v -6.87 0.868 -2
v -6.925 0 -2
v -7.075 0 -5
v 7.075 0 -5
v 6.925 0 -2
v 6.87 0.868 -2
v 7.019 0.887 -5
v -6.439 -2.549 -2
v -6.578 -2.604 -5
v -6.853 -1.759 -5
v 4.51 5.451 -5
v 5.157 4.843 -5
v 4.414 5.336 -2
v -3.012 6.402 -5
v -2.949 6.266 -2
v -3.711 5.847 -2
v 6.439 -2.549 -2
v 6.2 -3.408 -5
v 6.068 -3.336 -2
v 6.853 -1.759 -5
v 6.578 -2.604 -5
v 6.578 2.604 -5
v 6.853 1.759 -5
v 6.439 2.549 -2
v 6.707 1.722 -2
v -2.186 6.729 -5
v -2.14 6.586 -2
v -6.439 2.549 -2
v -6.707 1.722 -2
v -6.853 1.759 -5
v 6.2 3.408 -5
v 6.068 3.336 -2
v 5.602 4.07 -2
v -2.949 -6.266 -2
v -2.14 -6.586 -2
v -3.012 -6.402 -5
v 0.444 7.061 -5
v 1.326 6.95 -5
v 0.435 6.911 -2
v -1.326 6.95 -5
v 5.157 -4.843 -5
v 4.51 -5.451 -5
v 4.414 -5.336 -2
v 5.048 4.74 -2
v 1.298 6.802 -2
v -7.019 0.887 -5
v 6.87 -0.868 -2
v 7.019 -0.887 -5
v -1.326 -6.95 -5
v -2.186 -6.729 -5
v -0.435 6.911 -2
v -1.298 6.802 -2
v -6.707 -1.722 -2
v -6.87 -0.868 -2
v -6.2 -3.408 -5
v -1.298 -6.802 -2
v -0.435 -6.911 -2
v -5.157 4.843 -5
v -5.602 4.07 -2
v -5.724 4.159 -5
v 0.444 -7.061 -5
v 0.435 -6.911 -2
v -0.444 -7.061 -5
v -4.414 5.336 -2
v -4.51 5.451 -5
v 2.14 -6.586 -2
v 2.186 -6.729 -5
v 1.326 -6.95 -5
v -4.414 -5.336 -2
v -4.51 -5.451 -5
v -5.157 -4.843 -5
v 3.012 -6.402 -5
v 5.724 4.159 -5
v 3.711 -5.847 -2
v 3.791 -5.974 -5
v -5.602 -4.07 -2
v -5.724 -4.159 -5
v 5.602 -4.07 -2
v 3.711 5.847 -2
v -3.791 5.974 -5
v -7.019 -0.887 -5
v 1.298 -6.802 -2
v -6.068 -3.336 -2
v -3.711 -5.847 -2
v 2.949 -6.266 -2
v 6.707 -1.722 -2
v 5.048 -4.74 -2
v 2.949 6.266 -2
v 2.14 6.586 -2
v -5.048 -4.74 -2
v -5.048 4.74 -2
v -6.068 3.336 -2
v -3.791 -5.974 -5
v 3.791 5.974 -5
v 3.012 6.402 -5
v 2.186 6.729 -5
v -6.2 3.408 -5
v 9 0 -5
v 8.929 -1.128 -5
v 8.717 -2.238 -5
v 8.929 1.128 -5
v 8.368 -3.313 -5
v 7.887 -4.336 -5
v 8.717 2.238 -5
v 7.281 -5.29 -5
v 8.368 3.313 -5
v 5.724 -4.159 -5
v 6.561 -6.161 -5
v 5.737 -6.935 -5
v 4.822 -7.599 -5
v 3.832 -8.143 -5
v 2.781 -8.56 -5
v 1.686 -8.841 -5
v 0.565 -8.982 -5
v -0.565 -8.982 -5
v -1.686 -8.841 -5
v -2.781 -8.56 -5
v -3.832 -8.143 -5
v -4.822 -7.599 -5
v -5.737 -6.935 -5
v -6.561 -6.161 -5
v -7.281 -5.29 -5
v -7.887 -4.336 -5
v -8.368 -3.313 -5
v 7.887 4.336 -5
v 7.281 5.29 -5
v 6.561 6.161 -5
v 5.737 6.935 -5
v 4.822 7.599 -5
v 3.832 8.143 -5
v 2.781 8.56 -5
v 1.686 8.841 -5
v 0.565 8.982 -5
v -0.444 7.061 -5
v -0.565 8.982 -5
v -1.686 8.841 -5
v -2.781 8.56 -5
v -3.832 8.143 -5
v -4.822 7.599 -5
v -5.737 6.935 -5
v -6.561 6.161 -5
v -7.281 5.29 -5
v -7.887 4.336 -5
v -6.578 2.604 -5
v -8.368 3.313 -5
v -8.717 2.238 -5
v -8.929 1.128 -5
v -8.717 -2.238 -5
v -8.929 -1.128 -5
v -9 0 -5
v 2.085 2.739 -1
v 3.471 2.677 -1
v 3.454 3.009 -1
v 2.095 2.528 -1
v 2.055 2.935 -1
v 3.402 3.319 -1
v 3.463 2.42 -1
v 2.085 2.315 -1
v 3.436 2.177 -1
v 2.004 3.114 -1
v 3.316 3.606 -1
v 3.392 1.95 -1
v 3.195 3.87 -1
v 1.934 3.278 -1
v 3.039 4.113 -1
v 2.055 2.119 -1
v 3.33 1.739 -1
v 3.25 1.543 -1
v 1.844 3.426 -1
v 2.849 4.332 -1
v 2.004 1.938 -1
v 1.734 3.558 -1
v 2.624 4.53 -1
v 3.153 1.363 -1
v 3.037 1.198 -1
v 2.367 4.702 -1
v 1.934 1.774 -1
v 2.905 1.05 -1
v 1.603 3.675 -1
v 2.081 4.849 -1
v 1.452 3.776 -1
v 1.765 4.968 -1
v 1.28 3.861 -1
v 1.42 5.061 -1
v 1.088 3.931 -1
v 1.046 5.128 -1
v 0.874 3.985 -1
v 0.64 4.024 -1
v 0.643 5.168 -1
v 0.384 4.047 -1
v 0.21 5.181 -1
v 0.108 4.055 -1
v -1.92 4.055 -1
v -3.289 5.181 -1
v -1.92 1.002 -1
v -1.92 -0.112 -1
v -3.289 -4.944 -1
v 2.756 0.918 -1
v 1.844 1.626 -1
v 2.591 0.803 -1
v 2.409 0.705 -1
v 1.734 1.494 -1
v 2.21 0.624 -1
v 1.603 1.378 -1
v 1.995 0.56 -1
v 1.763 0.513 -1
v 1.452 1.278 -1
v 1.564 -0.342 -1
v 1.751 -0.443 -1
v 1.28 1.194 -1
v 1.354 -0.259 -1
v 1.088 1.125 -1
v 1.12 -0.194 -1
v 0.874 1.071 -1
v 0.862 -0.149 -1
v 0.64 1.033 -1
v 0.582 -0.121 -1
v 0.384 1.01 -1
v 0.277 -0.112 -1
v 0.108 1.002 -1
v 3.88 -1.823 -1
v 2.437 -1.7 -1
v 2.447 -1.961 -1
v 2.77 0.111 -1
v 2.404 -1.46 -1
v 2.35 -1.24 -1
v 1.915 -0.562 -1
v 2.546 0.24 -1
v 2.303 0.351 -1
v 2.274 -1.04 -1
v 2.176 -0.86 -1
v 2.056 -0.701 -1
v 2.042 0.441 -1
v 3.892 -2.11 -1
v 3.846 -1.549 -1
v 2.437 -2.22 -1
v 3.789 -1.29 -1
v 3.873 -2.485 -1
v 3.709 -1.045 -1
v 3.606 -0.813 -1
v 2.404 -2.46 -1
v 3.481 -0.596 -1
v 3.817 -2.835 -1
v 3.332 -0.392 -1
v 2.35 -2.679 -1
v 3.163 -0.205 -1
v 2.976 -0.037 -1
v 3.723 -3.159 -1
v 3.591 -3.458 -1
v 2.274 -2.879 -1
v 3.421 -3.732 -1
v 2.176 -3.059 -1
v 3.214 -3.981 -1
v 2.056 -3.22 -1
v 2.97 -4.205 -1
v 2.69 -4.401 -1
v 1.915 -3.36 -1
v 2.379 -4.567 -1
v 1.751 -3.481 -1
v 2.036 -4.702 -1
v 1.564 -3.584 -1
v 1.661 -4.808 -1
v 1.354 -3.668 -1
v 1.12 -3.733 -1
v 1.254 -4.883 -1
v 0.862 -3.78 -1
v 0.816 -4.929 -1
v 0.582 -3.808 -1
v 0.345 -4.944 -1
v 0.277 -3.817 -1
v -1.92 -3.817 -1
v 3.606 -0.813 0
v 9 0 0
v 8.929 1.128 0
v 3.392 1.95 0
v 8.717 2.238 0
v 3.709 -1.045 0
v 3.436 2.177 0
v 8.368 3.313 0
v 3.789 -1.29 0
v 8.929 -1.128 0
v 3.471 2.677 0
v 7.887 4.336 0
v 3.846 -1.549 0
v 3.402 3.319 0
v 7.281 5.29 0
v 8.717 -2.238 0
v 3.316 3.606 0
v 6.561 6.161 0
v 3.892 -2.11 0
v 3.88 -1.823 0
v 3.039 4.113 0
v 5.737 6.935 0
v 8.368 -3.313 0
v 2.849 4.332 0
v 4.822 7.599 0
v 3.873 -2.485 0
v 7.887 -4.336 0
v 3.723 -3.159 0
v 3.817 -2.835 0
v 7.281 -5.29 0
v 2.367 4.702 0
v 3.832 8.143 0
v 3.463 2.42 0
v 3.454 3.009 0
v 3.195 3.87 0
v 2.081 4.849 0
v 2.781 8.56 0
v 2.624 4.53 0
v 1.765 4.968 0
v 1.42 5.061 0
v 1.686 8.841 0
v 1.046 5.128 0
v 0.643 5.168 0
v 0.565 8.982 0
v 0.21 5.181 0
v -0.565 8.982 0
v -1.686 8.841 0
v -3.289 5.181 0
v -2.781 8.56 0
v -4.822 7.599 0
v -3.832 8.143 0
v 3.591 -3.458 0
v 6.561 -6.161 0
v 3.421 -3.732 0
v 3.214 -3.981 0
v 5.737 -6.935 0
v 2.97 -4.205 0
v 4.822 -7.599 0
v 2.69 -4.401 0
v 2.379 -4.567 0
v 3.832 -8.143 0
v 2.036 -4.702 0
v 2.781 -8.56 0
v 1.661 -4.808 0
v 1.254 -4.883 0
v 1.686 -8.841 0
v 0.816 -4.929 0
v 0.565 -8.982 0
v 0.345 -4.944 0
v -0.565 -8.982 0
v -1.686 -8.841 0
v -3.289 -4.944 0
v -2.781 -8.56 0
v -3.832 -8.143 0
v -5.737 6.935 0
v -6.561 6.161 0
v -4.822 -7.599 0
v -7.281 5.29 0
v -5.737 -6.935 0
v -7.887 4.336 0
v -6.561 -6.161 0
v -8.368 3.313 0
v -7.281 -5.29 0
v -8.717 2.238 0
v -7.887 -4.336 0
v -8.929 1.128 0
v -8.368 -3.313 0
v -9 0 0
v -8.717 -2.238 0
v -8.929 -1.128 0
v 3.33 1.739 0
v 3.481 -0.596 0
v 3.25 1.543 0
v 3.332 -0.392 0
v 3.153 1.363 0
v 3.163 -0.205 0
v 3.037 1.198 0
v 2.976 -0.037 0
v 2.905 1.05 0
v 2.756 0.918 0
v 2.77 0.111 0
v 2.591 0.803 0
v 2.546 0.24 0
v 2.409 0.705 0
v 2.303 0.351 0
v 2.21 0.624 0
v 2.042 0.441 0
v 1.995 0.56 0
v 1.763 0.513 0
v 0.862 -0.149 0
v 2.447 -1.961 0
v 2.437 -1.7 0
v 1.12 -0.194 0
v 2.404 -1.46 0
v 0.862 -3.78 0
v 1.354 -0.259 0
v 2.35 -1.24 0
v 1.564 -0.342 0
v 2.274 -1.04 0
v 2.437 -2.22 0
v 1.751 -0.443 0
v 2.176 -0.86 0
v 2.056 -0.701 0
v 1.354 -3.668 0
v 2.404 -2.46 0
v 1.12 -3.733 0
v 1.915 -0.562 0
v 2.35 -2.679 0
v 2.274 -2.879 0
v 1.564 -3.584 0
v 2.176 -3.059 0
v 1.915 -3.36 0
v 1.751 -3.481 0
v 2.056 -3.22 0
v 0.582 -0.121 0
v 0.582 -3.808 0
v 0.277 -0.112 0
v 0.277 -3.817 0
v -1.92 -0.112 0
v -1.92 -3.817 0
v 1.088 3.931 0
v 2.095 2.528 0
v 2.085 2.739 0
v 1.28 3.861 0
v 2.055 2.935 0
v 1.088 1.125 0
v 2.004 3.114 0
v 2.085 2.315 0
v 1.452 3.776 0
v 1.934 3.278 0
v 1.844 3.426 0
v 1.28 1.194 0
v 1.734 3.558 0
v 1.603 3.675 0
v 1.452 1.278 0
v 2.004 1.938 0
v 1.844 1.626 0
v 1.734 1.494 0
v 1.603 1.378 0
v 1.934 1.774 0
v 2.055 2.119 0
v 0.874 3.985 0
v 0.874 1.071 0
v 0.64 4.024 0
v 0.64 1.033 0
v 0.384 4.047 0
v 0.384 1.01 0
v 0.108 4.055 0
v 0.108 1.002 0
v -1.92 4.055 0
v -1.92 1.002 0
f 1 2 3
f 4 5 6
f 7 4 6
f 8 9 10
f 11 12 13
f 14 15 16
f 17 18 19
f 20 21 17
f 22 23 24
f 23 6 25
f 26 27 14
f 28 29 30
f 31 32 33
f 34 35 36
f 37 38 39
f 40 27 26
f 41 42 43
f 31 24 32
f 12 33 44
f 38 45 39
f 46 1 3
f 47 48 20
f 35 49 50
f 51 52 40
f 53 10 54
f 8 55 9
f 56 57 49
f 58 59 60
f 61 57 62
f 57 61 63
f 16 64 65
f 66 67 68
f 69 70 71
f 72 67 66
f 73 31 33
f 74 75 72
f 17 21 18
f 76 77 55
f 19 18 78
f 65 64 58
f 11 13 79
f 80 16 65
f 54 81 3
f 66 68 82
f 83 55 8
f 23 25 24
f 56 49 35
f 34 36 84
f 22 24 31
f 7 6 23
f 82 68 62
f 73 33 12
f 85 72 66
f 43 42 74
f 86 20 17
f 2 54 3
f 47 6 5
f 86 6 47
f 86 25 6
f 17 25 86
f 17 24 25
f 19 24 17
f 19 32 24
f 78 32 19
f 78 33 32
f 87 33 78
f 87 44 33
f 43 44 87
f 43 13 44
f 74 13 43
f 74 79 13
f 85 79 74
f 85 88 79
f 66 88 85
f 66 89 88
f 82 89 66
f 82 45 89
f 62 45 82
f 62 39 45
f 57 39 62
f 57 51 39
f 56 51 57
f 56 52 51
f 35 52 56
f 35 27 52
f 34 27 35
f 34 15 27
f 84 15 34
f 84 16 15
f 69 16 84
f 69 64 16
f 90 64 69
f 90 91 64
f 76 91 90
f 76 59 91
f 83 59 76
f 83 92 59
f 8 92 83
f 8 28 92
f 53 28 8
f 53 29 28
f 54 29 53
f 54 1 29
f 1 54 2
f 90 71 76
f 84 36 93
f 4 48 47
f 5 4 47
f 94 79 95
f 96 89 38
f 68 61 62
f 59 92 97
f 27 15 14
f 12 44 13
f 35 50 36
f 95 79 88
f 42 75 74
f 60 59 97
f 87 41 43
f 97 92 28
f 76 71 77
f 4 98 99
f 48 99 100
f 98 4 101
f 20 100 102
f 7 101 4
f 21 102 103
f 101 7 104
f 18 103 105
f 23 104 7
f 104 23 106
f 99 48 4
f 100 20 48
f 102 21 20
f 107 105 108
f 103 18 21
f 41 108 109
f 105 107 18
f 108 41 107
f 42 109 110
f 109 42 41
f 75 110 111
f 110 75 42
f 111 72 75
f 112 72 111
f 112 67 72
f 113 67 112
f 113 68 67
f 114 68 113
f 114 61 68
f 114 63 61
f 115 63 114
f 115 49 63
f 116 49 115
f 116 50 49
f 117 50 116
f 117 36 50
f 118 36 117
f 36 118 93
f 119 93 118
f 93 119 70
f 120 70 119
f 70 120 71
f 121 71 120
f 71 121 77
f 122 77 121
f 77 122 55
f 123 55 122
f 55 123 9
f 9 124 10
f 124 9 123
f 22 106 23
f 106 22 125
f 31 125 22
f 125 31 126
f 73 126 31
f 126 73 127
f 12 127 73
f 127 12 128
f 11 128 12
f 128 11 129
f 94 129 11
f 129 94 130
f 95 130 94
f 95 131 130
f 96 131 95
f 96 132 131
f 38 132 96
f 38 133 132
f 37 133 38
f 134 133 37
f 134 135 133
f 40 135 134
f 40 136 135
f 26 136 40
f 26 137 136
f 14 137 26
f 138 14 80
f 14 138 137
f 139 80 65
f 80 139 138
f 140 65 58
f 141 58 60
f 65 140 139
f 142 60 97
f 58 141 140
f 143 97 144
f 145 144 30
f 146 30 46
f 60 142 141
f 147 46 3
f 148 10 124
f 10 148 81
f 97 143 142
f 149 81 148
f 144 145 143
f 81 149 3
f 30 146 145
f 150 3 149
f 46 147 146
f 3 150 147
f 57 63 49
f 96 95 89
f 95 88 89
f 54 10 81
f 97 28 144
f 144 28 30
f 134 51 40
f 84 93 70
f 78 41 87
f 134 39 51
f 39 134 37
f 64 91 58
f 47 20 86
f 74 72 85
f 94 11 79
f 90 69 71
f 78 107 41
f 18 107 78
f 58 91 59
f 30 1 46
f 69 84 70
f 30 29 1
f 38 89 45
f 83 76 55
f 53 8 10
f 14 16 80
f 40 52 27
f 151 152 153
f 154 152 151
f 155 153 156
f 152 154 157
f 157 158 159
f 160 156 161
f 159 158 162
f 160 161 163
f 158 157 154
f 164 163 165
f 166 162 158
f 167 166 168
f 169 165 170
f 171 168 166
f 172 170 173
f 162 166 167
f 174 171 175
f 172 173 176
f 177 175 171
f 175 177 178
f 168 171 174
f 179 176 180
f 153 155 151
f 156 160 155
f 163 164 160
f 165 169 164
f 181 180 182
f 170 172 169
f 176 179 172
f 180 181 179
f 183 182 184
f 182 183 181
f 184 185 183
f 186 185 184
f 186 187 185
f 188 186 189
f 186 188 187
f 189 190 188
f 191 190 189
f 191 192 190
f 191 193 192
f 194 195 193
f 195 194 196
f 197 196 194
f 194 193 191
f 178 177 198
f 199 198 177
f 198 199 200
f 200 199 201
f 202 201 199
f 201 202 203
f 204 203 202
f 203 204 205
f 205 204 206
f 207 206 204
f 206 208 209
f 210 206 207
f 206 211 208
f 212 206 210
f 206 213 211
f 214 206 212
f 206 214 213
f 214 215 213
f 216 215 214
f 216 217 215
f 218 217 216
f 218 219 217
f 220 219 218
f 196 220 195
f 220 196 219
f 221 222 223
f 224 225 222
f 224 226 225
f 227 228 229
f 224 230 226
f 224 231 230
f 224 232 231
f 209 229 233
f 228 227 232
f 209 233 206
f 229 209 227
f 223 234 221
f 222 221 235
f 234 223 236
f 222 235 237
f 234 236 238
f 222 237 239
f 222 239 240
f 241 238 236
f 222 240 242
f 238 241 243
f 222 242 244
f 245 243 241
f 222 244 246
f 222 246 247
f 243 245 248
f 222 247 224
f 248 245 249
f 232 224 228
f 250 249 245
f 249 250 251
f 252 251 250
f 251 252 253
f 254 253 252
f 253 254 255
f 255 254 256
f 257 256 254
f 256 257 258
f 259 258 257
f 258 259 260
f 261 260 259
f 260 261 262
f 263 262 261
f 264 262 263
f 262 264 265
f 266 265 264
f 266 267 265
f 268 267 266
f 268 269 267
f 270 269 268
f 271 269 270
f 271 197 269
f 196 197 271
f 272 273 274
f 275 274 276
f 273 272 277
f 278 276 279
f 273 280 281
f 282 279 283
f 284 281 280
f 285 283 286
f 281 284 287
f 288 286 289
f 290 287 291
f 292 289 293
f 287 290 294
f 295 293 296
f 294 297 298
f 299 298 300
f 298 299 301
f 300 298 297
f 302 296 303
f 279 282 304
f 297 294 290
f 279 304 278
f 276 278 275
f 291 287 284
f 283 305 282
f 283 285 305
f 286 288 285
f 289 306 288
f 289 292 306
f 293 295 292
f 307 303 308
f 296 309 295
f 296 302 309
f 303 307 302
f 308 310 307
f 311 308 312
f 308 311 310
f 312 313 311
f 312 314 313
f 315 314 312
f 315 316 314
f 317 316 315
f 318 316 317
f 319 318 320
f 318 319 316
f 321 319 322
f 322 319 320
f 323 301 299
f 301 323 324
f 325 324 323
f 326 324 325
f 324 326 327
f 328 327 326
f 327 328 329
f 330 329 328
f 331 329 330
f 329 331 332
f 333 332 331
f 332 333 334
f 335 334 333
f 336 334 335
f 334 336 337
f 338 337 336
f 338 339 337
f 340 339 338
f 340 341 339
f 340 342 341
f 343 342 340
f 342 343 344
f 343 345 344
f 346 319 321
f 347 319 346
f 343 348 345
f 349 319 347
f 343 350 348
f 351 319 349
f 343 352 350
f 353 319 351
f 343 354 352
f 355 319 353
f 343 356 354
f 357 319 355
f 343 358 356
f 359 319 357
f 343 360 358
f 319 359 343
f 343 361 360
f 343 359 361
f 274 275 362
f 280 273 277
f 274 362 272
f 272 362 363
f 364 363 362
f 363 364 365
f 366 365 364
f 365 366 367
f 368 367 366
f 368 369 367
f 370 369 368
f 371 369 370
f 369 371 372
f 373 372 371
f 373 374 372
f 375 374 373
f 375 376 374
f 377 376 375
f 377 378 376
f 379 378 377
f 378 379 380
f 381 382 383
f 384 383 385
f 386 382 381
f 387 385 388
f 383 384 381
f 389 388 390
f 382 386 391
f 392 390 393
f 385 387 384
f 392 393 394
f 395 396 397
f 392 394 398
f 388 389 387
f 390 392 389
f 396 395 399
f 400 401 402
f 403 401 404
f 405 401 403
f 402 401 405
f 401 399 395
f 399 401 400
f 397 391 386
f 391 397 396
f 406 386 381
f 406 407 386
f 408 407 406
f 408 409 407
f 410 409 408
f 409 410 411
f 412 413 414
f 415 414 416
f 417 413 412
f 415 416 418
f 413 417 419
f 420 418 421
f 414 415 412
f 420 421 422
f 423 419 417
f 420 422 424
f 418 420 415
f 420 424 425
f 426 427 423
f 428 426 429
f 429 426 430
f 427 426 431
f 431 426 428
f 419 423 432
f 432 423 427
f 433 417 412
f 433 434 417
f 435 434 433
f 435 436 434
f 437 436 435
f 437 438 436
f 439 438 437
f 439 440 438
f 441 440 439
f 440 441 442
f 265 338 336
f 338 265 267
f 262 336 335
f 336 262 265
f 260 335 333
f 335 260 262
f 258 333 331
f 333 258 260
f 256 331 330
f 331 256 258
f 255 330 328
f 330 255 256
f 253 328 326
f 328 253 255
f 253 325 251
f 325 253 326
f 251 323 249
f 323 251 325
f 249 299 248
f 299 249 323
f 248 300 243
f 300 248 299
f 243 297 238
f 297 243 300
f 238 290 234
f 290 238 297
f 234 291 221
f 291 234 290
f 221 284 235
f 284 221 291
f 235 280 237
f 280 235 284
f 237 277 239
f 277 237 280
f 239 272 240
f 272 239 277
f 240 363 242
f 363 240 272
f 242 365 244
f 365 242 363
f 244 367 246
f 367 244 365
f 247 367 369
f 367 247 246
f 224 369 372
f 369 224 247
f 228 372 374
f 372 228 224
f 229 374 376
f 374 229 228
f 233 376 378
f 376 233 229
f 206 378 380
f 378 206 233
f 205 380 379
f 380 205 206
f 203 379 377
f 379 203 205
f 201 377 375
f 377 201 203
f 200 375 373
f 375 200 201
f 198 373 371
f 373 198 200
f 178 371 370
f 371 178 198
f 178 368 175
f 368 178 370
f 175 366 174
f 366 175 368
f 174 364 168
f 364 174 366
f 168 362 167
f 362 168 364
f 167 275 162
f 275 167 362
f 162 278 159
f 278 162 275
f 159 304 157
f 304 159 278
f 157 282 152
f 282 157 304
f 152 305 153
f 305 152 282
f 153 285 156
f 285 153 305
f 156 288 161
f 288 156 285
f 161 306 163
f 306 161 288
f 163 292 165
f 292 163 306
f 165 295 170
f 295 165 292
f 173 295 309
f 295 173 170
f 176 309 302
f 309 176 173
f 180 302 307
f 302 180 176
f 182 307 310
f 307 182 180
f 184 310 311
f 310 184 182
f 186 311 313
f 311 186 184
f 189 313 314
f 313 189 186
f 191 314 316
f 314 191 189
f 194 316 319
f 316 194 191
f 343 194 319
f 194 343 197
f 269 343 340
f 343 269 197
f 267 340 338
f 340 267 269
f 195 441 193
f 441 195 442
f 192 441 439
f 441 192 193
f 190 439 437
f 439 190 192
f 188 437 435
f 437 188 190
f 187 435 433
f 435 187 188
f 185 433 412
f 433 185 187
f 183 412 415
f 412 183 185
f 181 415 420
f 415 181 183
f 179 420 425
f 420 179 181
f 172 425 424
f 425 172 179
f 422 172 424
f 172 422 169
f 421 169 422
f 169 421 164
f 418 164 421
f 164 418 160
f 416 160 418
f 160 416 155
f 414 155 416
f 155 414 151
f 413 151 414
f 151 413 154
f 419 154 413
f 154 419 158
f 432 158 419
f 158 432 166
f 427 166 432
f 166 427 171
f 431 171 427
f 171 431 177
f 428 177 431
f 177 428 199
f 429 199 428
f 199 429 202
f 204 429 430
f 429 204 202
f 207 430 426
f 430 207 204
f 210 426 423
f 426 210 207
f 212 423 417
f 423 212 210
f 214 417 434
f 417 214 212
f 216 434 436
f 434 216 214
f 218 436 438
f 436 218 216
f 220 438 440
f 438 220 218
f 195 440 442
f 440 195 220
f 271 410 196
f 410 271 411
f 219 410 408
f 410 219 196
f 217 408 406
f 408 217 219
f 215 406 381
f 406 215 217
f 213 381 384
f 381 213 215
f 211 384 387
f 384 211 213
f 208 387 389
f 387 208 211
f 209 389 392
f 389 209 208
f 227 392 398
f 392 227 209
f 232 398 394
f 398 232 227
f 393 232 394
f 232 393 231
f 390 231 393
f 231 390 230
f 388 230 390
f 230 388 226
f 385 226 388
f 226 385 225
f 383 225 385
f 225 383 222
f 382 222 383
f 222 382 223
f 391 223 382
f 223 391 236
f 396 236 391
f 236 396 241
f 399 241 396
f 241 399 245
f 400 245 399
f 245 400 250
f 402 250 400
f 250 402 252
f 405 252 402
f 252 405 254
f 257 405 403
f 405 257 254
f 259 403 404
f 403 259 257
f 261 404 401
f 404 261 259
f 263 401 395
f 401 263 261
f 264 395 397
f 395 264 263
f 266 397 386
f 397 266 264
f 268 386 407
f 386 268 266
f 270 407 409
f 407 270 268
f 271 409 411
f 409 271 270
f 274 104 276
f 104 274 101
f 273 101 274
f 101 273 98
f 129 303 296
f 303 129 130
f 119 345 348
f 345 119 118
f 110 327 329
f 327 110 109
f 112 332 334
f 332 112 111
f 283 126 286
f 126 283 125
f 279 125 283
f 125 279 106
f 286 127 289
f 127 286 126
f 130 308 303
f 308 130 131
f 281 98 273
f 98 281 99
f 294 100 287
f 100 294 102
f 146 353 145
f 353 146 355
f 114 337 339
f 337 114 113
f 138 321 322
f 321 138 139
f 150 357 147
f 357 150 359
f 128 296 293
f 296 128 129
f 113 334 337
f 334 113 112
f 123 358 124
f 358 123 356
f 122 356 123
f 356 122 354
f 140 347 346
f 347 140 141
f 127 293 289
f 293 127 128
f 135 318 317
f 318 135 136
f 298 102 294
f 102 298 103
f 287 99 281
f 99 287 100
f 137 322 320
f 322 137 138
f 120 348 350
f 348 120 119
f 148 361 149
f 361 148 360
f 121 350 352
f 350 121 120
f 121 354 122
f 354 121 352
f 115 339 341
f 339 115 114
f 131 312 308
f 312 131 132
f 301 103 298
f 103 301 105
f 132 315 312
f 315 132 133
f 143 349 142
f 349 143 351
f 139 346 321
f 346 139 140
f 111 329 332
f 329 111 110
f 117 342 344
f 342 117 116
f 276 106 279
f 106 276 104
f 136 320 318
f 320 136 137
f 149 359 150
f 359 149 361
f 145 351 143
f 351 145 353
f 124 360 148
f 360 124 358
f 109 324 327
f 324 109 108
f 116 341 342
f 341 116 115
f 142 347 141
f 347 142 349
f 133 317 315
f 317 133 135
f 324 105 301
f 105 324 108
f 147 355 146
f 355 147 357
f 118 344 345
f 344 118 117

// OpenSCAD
$fn = 50;

difference() {
	union() {
		translate(v = [0, 0, -5.0]) {
			cylinder(h = 5, r = 9.0);
		}
	}
	union() {
		#translate(v = [0, 0, -5.0]) {
			cylinder(h = 3, r1 = 7.075, r2 = 6.925);
		}
		translate(v = [0, 0, -1]) {
			linear_extrude(height = 1) {
				text(font = "Impact", halign = "center", size = 10, text = "B", valign = "center");
			}
		}
	}
}
